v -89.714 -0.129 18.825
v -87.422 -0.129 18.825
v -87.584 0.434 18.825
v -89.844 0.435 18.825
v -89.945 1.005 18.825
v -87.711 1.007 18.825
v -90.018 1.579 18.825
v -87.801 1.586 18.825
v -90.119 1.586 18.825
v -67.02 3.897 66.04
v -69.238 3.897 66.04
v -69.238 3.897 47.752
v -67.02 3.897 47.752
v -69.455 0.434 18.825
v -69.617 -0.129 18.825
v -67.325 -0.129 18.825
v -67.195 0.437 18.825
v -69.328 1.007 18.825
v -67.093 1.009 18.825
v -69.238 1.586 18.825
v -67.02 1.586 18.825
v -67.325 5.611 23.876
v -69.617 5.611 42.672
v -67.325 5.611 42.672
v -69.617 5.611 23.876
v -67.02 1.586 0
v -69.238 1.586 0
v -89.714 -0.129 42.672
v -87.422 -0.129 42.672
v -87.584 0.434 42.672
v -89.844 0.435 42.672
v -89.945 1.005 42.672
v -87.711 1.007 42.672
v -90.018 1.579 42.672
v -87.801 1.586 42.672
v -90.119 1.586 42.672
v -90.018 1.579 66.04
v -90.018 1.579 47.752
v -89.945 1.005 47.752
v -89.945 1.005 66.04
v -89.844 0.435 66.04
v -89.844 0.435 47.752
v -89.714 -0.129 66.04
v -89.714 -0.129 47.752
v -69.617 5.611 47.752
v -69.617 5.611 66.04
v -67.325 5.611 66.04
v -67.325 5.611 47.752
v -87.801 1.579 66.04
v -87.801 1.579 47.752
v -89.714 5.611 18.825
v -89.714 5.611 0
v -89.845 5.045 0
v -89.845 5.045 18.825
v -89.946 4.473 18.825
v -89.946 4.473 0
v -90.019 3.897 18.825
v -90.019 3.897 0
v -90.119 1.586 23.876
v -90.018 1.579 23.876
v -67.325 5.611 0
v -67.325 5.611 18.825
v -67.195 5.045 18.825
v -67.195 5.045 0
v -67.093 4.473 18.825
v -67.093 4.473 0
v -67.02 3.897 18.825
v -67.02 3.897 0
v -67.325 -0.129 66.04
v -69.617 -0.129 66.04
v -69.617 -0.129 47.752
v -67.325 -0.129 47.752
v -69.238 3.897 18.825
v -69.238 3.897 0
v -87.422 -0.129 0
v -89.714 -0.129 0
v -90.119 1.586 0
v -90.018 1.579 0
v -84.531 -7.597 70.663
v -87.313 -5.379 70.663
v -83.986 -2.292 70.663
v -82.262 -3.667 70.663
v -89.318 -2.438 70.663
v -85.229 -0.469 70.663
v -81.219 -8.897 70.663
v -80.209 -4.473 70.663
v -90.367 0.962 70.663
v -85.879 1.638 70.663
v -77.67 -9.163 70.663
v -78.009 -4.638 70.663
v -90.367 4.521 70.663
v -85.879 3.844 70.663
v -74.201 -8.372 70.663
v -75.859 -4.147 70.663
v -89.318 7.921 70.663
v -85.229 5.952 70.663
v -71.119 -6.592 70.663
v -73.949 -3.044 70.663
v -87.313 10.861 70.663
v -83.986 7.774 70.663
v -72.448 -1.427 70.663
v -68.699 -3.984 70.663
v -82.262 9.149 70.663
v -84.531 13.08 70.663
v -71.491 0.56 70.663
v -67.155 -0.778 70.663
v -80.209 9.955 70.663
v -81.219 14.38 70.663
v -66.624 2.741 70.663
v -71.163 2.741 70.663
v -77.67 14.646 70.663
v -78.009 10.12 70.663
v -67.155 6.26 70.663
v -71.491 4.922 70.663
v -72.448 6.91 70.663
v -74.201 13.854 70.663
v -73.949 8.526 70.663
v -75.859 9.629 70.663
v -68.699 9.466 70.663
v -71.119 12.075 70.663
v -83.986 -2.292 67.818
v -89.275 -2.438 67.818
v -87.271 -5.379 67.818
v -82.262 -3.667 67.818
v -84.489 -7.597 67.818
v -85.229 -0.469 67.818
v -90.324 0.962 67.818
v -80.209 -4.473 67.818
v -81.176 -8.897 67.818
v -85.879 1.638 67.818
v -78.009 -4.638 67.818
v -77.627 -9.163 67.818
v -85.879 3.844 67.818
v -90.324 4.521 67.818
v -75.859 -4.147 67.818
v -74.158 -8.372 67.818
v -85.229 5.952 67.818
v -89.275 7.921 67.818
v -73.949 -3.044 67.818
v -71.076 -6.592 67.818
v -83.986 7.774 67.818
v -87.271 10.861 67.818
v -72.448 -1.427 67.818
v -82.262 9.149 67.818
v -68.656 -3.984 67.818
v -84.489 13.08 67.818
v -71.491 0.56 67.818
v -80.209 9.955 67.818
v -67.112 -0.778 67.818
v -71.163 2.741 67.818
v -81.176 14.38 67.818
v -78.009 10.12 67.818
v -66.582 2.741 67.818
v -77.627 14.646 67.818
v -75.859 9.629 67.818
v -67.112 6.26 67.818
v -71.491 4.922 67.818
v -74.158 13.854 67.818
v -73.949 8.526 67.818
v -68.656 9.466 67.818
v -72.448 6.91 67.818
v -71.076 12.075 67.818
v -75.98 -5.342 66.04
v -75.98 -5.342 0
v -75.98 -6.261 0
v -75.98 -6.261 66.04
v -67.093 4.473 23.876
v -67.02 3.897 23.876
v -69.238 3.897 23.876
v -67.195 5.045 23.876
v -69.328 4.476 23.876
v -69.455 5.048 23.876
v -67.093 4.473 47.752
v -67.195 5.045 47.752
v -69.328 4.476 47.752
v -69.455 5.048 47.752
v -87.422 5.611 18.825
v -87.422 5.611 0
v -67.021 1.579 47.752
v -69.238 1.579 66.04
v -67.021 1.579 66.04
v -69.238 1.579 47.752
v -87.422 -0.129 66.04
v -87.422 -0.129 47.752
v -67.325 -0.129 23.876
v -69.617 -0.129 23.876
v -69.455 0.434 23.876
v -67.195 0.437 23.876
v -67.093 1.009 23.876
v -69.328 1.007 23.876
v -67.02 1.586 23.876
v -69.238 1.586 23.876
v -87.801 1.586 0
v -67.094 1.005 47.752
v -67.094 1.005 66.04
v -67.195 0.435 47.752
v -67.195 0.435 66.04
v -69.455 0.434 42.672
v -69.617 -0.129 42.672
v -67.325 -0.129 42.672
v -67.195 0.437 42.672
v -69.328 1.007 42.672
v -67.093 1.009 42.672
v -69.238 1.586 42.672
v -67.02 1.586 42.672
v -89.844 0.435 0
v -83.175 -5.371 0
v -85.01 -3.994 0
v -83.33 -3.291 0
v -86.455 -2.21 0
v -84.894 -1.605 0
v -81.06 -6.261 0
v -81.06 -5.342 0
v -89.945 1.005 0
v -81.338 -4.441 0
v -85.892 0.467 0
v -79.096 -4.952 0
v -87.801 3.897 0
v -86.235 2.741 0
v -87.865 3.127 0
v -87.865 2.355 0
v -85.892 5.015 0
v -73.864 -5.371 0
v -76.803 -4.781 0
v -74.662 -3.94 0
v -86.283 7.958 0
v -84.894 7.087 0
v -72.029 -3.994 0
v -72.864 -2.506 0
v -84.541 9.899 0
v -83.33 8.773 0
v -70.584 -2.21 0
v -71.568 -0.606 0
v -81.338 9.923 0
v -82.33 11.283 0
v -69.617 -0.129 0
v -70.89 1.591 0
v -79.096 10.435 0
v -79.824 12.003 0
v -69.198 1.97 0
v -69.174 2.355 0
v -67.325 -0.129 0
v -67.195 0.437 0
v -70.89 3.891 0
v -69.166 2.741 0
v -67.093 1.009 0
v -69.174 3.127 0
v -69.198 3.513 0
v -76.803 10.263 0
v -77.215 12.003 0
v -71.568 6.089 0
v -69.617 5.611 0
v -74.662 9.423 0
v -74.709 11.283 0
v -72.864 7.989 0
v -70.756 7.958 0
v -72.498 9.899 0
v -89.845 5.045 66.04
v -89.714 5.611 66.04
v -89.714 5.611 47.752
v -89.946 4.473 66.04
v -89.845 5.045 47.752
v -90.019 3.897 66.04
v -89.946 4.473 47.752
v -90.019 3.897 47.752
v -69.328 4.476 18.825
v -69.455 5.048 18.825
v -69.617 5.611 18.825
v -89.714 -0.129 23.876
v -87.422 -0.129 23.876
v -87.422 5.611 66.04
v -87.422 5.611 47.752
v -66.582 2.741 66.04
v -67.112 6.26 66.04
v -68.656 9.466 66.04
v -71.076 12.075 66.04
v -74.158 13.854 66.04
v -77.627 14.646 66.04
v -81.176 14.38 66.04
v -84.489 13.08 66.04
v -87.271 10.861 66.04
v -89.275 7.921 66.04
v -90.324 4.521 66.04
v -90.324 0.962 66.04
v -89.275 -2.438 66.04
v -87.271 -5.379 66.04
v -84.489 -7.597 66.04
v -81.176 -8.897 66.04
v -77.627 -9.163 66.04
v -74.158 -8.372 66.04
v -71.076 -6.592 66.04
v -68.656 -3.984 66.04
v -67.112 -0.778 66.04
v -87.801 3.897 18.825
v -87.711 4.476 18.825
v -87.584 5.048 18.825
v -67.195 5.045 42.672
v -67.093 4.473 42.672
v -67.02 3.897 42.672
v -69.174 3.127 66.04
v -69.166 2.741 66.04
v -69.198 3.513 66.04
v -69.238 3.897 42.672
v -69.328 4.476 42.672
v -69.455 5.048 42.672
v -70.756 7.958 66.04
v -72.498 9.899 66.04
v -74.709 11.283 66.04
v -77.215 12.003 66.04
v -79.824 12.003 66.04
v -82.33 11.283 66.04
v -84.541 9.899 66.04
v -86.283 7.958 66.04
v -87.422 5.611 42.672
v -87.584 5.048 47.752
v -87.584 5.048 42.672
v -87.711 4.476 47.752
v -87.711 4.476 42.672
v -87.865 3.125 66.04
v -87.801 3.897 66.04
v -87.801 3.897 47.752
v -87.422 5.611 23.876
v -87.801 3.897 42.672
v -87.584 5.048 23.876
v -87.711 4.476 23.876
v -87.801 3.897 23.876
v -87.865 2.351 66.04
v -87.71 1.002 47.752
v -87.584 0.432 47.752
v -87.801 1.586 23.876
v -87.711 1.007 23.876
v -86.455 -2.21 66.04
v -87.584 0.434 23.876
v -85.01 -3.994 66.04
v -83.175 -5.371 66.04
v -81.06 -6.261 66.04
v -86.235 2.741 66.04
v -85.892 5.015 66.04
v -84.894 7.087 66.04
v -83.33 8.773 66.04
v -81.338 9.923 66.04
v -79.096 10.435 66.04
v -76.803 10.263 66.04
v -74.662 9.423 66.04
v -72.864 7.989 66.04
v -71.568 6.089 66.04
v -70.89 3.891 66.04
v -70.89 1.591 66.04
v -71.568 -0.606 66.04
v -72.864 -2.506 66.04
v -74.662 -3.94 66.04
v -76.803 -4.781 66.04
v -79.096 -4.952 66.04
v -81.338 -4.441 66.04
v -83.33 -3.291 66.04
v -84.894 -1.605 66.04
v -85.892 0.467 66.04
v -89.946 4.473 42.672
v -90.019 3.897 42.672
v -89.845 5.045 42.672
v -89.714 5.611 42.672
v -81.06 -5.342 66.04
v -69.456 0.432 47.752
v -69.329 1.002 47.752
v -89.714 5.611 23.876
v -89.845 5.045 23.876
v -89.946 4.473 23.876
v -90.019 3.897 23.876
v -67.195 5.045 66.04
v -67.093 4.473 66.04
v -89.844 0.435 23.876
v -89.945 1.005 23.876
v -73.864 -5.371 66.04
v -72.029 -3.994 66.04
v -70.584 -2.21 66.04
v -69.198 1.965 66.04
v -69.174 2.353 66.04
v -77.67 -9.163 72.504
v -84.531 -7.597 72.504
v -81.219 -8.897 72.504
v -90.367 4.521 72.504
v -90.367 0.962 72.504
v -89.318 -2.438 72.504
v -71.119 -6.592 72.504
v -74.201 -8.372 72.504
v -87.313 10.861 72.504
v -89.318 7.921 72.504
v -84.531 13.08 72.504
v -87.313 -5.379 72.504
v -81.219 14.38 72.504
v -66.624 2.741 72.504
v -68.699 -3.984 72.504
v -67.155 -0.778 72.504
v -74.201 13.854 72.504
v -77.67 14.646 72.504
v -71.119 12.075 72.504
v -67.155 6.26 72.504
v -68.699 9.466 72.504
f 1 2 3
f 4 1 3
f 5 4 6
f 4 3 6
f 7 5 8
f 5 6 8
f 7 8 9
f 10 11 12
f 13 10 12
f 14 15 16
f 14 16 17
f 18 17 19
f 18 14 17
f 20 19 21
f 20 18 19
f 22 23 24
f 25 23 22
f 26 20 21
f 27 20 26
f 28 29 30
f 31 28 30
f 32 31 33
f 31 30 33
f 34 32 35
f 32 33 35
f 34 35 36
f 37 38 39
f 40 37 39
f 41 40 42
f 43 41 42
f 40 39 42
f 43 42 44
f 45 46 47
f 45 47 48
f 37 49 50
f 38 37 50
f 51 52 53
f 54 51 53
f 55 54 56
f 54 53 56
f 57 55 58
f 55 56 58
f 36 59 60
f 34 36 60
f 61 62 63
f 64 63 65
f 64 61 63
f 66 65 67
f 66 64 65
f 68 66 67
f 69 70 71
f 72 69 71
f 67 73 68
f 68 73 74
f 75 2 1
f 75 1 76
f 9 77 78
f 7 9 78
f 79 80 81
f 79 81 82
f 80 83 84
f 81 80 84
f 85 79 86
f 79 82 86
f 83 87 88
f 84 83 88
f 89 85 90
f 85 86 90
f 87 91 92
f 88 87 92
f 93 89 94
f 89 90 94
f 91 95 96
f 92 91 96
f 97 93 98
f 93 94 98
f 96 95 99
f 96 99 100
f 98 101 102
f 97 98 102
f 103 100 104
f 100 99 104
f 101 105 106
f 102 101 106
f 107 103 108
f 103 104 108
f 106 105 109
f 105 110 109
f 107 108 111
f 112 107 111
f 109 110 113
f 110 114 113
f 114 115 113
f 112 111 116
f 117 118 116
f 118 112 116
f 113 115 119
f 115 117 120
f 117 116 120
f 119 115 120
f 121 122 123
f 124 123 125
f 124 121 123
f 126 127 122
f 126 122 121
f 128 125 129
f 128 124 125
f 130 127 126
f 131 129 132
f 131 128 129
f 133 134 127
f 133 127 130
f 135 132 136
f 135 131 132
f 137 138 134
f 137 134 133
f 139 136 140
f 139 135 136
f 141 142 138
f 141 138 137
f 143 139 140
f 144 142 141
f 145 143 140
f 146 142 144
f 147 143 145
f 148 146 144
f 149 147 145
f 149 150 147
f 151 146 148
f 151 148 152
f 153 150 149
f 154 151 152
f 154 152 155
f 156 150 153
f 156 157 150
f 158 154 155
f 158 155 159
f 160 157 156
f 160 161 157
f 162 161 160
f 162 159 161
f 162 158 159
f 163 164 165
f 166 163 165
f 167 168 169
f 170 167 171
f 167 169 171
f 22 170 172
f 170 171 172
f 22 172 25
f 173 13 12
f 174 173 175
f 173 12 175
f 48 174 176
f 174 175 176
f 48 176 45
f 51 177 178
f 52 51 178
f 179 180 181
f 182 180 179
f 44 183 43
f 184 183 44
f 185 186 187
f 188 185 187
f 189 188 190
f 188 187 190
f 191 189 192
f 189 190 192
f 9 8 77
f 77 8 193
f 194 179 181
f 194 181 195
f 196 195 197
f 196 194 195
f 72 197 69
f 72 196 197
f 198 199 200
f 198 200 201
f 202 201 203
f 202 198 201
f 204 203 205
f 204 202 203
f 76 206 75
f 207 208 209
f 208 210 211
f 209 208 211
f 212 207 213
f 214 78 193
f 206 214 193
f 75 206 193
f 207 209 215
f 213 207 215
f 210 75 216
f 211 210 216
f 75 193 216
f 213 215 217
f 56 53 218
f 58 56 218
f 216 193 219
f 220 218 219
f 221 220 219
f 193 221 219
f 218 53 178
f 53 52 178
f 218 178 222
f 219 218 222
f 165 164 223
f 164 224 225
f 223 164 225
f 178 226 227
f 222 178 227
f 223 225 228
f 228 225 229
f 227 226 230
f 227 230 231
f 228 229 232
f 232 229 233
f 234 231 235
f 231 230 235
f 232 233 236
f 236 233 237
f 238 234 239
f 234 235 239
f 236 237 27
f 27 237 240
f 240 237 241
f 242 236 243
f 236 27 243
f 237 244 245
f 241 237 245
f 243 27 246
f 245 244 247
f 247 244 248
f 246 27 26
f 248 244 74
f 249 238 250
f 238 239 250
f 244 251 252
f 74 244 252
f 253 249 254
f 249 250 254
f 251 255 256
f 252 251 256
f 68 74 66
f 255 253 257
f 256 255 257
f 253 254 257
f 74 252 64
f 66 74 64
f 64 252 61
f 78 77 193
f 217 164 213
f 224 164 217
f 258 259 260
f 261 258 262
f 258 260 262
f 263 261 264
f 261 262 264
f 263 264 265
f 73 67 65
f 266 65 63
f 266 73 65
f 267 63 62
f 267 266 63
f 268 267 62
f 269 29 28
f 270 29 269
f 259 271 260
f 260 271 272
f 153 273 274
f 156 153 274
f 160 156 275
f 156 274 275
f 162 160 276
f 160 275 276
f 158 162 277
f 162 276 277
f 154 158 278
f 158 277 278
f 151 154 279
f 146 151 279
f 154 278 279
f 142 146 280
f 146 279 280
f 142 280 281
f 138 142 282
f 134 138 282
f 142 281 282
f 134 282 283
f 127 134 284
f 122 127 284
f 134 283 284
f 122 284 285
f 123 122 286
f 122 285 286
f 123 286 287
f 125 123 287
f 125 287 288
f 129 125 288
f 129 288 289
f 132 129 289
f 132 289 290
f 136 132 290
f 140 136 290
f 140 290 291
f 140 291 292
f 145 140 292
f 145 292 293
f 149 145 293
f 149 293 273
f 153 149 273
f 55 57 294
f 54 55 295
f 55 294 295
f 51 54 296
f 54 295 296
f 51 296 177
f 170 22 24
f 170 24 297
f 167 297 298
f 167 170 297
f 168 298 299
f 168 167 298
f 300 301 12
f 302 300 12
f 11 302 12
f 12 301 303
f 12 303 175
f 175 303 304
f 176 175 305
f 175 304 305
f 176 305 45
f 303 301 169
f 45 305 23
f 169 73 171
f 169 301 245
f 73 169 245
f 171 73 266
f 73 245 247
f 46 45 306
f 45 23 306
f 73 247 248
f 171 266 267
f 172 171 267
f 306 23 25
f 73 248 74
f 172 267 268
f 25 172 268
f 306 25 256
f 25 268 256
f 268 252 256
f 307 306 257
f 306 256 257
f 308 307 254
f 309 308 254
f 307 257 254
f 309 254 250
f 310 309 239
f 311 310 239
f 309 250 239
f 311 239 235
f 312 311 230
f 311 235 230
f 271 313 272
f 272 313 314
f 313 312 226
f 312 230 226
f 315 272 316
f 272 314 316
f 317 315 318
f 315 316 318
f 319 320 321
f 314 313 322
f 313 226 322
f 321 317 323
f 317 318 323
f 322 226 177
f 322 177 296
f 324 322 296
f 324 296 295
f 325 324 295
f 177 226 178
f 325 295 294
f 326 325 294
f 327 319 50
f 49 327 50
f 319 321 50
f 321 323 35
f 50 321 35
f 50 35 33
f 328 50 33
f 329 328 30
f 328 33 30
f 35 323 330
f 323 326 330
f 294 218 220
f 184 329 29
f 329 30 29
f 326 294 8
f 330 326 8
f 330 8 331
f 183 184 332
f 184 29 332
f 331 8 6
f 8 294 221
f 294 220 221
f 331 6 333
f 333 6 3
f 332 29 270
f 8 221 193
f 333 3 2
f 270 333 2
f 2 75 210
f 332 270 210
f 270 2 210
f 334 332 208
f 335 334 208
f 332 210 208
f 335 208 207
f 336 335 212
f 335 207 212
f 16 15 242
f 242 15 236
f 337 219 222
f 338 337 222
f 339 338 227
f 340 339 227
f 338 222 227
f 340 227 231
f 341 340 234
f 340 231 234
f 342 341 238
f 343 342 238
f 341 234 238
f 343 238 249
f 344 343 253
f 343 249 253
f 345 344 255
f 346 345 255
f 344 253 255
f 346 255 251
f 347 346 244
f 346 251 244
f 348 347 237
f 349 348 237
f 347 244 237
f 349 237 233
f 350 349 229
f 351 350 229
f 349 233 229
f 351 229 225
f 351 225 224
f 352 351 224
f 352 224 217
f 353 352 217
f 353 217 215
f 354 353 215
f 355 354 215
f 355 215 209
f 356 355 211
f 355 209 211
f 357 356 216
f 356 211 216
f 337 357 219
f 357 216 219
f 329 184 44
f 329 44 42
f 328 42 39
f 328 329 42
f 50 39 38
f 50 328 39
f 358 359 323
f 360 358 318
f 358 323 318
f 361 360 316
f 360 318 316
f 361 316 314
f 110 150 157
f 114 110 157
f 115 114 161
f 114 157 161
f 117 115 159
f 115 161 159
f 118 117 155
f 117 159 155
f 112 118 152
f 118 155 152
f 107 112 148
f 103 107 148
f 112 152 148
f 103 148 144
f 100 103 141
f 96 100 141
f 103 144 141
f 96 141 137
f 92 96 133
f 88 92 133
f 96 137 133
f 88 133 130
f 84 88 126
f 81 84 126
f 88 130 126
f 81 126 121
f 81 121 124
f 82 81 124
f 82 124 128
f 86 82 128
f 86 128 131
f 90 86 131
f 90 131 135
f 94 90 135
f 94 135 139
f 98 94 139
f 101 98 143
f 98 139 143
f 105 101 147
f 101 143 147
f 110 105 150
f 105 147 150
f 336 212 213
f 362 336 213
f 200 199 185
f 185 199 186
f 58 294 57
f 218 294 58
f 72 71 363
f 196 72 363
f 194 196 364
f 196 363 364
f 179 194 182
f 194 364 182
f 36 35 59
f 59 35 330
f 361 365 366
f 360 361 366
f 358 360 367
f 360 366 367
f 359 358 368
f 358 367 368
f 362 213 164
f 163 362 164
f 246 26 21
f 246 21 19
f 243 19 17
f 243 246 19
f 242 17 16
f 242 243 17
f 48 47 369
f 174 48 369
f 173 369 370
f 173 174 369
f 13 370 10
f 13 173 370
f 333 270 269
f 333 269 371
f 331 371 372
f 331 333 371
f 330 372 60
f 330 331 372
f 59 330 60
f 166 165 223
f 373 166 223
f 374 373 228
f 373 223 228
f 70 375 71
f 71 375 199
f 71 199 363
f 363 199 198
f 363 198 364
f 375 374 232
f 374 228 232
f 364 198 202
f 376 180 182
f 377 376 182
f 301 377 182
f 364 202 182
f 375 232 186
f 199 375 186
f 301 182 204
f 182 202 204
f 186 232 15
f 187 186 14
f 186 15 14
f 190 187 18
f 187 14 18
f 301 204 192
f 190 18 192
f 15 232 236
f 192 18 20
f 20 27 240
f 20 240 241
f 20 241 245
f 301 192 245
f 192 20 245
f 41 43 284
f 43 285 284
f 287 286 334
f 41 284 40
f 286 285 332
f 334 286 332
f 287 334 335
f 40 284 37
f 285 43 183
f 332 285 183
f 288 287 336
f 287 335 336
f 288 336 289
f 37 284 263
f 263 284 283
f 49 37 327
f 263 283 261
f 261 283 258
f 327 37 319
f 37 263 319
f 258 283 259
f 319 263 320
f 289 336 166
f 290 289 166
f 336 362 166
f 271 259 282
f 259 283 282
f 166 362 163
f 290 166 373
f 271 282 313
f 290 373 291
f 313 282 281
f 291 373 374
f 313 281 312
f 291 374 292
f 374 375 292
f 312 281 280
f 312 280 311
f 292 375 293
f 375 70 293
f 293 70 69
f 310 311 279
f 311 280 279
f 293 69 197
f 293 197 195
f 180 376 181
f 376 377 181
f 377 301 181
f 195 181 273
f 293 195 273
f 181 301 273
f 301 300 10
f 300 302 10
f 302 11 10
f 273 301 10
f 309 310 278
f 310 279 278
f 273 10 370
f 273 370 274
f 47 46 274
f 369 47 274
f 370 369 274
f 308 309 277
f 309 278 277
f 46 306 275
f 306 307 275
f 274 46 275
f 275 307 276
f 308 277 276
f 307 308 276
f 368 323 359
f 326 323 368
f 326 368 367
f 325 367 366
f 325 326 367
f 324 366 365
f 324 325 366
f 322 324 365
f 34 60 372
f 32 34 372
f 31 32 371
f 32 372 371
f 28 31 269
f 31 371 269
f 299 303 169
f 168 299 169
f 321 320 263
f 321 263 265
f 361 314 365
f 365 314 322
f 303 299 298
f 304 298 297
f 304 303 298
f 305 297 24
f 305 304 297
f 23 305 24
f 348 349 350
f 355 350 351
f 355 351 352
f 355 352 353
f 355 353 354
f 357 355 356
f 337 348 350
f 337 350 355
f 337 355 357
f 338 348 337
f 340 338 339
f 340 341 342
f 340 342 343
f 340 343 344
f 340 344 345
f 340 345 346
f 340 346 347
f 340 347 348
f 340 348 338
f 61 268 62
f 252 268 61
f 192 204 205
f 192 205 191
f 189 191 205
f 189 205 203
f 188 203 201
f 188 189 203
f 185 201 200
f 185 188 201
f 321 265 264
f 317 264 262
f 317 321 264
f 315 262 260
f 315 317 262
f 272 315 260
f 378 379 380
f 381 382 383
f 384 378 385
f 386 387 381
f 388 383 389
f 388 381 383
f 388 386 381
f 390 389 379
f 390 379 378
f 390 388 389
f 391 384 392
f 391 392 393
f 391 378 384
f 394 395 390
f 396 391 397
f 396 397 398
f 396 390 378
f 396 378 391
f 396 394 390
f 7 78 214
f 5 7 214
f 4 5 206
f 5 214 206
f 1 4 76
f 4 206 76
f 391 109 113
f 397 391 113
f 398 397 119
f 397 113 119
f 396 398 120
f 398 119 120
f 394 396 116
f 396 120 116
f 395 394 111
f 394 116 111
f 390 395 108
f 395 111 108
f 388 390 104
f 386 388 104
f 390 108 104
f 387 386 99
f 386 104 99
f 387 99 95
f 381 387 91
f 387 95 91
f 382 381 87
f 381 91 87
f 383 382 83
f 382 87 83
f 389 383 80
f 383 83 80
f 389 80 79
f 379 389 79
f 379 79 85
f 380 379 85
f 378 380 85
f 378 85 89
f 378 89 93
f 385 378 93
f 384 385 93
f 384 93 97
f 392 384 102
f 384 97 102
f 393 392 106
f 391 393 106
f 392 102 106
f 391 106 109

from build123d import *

# Parameters (mm, degrees)
SKETCH1_R           = 9.35355
BOSS_EXTRUDE1_DEPTH = 66.04
SKETCH7_R           = 11.938
BOSS_EXTRUDE4_DEPTH = 1.778
SKETCH14_R          = 7.71525
CUT_EXTRUDE1_DEPTH  = 66.04
SKETCH12_W          = 18.288
SKETCH12_H          = 1.7145
SKETCH12_H_2        = 1.707763716
SKETCH12_W_2        = 18.824802472
SKETCH12_W_3        = 18.796
BOSS_EXTRUDE5_DEPTH = 2.8448
CUT_EXTRUDE2_DEPTH  = 66.04
SKETCH21_R          = 7.399529871
BOSS_EXTRUDE7_DEPTH = 2.8448
SKETCH22_R          = 11.938
BOSS_EXTRUDE8_DEPTH = 1.8415
CUT_EXTRUDE3_DEPTH  = 66.04


with BuildPart() as part:
    # Sketch1 → Boss-Extrude1 (new body)
    with BuildSketch(Plane.XY):
        with Locations((-78.519529871, 2.741262574)):
            Circle(SKETCH1_R)
    extrude(amount=BOSS_EXTRUDE1_DEPTH)

    # Sketch7 → Boss-Extrude4 (add)
    with BuildSketch(Plane.XY.offset(66.04)):
        with Locations((-78.519529871, 2.741262574)):
            Circle(SKETCH7_R)
    extrude(amount=BOSS_EXTRUDE4_DEPTH)

    # Sketch14 → Cut-Extrude1 (cut)
    with BuildSketch(Plane(origin=(0, 0, 0), x_dir=(-1, 0, 0), z_dir=(0, 0, -1))):
        with Locations((78.519529871, 2.741262574)):
            Circle(SKETCH14_R)
    extrude(amount=-CUT_EXTRUDE1_DEPTH, mode=Mode.SUBTRACT)

    # Sketch12 → Boss-Extrude5 (add)
    with BuildSketch(Plane(origin=(-69.85, 0, 0), x_dir=(0, 0, -1), z_dir=(1, 0, 0))):
        with Locations((-56.896, 4.754212574)):
            Rectangle(SKETCH12_W, SKETCH12_H)
        with Locations((-56.896, 0.724944432)):
            Rectangle(SKETCH12_W, SKETCH12_H_2)
        with Locations((-9.412401236, 0.728312574)):
            Rectangle(SKETCH12_W_2, SKETCH12_H)
        with Locations((-9.412401236, 4.754212574)):
            Rectangle(SKETCH12_W_2, SKETCH12_H)
        with Locations((-33.274, 0.728312574)):
            Rectangle(SKETCH12_W_3, SKETCH12_H)
        with Locations((-33.274, 4.754212574)):
            Rectangle(SKETCH12_W_3, SKETCH12_H)
    boss_extrude5 = extrude(amount=BOSS_EXTRUDE5_DEPTH)

    # Mirror2: Boss-Extrude5 across plane
    add(boss_extrude5.mirror(Plane(origin=(-78.5622, 0, 0), x_dir=(0, 0, 1), z_dir=(1, 0, 0))))

    # Sketch19 → Cut-Extrude2 (cut)
    with BuildSketch(Plane(origin=(0, 0, 0), x_dir=(-1, 0, 0), z_dir=(0, 0, -1))):
        with BuildLine():
            Line((67.02046006, 3.896962574), (67.0052, 3.896962574))
            Line((67.0052, 3.896962574), (67.0052, 5.611462574))
            Line((67.0052, 5.611462574), (67.324611338, 5.611462574))
            ThreePointArc((67.324611338, 5.611462574), (67.140199737, 4.759948955), (67.02046006, 3.896962574))
        make_face()
        with BuildLine():
            Line((67.0052, 1.585562574), (67.02046006, 1.585562574))
            ThreePointArc((67.02046006, 1.585562574), (67.140199737, 0.722576194), (67.324611338, -0.128937426))
            Line((67.324611338, -0.128937426), (67.0052, -0.128937426))
            Line((67.0052, -0.128937426), (67.0052, 1.585562574))
        make_face()
        with BuildLine():
            Line((90.1192, 5.611462574), (89.714448404, 5.611462574))
            ThreePointArc((89.714448404, 5.611462574), (89.898860005, 4.759948955), (90.018599681, 3.896962574))
            Line((90.018599681, 3.896962574), (90.1192, 3.896962574))
            Line((90.1192, 3.896962574), (90.1192, 5.611462574))
        make_face()
        with BuildLine():
            Line((89.714448404, -0.128937426), (90.1192, -0.128937426))
            Line((90.1192, -0.128937426), (90.1192, 1.585562574))
            Line((90.1192, 1.585562574), (90.017920666, 1.57882629))
            ThreePointArc((90.017920666, 1.57882629), (89.898268214, 0.719243113), (89.714448404, -0.128937426))
        make_face()
    extrude(amount=-CUT_EXTRUDE2_DEPTH, mode=Mode.SUBTRACT)

    # Sketch21 → Boss-Extrude7 (add)
    with BuildSketch(Plane.XY.offset(67.818)):
        with Locations((-78.5622, 2.741262574)):
            Circle(SKETCH21_R)
    extrude(amount=BOSS_EXTRUDE7_DEPTH)

    # Sketch22 → Boss-Extrude8 (add)
    with BuildSketch(Plane.XY.offset(70.6628)):
        with Locations((-78.5622, 2.741262574)):
            Circle(SKETCH22_R)
    extrude(amount=BOSS_EXTRUDE8_DEPTH)

    # Sketch17 → Cut-Extrude3 (cut)
    with BuildSketch(Plane(origin=(0, 0, 0), x_dir=(-1, 0, 0), z_dir=(0, 0, -1))):
        with BuildLine():
            Line((75.979529871, -5.342287426), (75.979529871, -6.260809276))
            ThreePointArc((75.979529871, -6.260809276), (78.519529871, -6.612287426), (81.059529871, -6.260809276))
            Line((81.059529871, -6.260809276), (81.059529871, -5.342287426))
            Line((81.059529871, -5.342287426), (75.979529871, -5.342287426))
        make_face()
    extrude(amount=-CUT_EXTRUDE3_DEPTH, mode=Mode.SUBTRACT)


solid = part.part
